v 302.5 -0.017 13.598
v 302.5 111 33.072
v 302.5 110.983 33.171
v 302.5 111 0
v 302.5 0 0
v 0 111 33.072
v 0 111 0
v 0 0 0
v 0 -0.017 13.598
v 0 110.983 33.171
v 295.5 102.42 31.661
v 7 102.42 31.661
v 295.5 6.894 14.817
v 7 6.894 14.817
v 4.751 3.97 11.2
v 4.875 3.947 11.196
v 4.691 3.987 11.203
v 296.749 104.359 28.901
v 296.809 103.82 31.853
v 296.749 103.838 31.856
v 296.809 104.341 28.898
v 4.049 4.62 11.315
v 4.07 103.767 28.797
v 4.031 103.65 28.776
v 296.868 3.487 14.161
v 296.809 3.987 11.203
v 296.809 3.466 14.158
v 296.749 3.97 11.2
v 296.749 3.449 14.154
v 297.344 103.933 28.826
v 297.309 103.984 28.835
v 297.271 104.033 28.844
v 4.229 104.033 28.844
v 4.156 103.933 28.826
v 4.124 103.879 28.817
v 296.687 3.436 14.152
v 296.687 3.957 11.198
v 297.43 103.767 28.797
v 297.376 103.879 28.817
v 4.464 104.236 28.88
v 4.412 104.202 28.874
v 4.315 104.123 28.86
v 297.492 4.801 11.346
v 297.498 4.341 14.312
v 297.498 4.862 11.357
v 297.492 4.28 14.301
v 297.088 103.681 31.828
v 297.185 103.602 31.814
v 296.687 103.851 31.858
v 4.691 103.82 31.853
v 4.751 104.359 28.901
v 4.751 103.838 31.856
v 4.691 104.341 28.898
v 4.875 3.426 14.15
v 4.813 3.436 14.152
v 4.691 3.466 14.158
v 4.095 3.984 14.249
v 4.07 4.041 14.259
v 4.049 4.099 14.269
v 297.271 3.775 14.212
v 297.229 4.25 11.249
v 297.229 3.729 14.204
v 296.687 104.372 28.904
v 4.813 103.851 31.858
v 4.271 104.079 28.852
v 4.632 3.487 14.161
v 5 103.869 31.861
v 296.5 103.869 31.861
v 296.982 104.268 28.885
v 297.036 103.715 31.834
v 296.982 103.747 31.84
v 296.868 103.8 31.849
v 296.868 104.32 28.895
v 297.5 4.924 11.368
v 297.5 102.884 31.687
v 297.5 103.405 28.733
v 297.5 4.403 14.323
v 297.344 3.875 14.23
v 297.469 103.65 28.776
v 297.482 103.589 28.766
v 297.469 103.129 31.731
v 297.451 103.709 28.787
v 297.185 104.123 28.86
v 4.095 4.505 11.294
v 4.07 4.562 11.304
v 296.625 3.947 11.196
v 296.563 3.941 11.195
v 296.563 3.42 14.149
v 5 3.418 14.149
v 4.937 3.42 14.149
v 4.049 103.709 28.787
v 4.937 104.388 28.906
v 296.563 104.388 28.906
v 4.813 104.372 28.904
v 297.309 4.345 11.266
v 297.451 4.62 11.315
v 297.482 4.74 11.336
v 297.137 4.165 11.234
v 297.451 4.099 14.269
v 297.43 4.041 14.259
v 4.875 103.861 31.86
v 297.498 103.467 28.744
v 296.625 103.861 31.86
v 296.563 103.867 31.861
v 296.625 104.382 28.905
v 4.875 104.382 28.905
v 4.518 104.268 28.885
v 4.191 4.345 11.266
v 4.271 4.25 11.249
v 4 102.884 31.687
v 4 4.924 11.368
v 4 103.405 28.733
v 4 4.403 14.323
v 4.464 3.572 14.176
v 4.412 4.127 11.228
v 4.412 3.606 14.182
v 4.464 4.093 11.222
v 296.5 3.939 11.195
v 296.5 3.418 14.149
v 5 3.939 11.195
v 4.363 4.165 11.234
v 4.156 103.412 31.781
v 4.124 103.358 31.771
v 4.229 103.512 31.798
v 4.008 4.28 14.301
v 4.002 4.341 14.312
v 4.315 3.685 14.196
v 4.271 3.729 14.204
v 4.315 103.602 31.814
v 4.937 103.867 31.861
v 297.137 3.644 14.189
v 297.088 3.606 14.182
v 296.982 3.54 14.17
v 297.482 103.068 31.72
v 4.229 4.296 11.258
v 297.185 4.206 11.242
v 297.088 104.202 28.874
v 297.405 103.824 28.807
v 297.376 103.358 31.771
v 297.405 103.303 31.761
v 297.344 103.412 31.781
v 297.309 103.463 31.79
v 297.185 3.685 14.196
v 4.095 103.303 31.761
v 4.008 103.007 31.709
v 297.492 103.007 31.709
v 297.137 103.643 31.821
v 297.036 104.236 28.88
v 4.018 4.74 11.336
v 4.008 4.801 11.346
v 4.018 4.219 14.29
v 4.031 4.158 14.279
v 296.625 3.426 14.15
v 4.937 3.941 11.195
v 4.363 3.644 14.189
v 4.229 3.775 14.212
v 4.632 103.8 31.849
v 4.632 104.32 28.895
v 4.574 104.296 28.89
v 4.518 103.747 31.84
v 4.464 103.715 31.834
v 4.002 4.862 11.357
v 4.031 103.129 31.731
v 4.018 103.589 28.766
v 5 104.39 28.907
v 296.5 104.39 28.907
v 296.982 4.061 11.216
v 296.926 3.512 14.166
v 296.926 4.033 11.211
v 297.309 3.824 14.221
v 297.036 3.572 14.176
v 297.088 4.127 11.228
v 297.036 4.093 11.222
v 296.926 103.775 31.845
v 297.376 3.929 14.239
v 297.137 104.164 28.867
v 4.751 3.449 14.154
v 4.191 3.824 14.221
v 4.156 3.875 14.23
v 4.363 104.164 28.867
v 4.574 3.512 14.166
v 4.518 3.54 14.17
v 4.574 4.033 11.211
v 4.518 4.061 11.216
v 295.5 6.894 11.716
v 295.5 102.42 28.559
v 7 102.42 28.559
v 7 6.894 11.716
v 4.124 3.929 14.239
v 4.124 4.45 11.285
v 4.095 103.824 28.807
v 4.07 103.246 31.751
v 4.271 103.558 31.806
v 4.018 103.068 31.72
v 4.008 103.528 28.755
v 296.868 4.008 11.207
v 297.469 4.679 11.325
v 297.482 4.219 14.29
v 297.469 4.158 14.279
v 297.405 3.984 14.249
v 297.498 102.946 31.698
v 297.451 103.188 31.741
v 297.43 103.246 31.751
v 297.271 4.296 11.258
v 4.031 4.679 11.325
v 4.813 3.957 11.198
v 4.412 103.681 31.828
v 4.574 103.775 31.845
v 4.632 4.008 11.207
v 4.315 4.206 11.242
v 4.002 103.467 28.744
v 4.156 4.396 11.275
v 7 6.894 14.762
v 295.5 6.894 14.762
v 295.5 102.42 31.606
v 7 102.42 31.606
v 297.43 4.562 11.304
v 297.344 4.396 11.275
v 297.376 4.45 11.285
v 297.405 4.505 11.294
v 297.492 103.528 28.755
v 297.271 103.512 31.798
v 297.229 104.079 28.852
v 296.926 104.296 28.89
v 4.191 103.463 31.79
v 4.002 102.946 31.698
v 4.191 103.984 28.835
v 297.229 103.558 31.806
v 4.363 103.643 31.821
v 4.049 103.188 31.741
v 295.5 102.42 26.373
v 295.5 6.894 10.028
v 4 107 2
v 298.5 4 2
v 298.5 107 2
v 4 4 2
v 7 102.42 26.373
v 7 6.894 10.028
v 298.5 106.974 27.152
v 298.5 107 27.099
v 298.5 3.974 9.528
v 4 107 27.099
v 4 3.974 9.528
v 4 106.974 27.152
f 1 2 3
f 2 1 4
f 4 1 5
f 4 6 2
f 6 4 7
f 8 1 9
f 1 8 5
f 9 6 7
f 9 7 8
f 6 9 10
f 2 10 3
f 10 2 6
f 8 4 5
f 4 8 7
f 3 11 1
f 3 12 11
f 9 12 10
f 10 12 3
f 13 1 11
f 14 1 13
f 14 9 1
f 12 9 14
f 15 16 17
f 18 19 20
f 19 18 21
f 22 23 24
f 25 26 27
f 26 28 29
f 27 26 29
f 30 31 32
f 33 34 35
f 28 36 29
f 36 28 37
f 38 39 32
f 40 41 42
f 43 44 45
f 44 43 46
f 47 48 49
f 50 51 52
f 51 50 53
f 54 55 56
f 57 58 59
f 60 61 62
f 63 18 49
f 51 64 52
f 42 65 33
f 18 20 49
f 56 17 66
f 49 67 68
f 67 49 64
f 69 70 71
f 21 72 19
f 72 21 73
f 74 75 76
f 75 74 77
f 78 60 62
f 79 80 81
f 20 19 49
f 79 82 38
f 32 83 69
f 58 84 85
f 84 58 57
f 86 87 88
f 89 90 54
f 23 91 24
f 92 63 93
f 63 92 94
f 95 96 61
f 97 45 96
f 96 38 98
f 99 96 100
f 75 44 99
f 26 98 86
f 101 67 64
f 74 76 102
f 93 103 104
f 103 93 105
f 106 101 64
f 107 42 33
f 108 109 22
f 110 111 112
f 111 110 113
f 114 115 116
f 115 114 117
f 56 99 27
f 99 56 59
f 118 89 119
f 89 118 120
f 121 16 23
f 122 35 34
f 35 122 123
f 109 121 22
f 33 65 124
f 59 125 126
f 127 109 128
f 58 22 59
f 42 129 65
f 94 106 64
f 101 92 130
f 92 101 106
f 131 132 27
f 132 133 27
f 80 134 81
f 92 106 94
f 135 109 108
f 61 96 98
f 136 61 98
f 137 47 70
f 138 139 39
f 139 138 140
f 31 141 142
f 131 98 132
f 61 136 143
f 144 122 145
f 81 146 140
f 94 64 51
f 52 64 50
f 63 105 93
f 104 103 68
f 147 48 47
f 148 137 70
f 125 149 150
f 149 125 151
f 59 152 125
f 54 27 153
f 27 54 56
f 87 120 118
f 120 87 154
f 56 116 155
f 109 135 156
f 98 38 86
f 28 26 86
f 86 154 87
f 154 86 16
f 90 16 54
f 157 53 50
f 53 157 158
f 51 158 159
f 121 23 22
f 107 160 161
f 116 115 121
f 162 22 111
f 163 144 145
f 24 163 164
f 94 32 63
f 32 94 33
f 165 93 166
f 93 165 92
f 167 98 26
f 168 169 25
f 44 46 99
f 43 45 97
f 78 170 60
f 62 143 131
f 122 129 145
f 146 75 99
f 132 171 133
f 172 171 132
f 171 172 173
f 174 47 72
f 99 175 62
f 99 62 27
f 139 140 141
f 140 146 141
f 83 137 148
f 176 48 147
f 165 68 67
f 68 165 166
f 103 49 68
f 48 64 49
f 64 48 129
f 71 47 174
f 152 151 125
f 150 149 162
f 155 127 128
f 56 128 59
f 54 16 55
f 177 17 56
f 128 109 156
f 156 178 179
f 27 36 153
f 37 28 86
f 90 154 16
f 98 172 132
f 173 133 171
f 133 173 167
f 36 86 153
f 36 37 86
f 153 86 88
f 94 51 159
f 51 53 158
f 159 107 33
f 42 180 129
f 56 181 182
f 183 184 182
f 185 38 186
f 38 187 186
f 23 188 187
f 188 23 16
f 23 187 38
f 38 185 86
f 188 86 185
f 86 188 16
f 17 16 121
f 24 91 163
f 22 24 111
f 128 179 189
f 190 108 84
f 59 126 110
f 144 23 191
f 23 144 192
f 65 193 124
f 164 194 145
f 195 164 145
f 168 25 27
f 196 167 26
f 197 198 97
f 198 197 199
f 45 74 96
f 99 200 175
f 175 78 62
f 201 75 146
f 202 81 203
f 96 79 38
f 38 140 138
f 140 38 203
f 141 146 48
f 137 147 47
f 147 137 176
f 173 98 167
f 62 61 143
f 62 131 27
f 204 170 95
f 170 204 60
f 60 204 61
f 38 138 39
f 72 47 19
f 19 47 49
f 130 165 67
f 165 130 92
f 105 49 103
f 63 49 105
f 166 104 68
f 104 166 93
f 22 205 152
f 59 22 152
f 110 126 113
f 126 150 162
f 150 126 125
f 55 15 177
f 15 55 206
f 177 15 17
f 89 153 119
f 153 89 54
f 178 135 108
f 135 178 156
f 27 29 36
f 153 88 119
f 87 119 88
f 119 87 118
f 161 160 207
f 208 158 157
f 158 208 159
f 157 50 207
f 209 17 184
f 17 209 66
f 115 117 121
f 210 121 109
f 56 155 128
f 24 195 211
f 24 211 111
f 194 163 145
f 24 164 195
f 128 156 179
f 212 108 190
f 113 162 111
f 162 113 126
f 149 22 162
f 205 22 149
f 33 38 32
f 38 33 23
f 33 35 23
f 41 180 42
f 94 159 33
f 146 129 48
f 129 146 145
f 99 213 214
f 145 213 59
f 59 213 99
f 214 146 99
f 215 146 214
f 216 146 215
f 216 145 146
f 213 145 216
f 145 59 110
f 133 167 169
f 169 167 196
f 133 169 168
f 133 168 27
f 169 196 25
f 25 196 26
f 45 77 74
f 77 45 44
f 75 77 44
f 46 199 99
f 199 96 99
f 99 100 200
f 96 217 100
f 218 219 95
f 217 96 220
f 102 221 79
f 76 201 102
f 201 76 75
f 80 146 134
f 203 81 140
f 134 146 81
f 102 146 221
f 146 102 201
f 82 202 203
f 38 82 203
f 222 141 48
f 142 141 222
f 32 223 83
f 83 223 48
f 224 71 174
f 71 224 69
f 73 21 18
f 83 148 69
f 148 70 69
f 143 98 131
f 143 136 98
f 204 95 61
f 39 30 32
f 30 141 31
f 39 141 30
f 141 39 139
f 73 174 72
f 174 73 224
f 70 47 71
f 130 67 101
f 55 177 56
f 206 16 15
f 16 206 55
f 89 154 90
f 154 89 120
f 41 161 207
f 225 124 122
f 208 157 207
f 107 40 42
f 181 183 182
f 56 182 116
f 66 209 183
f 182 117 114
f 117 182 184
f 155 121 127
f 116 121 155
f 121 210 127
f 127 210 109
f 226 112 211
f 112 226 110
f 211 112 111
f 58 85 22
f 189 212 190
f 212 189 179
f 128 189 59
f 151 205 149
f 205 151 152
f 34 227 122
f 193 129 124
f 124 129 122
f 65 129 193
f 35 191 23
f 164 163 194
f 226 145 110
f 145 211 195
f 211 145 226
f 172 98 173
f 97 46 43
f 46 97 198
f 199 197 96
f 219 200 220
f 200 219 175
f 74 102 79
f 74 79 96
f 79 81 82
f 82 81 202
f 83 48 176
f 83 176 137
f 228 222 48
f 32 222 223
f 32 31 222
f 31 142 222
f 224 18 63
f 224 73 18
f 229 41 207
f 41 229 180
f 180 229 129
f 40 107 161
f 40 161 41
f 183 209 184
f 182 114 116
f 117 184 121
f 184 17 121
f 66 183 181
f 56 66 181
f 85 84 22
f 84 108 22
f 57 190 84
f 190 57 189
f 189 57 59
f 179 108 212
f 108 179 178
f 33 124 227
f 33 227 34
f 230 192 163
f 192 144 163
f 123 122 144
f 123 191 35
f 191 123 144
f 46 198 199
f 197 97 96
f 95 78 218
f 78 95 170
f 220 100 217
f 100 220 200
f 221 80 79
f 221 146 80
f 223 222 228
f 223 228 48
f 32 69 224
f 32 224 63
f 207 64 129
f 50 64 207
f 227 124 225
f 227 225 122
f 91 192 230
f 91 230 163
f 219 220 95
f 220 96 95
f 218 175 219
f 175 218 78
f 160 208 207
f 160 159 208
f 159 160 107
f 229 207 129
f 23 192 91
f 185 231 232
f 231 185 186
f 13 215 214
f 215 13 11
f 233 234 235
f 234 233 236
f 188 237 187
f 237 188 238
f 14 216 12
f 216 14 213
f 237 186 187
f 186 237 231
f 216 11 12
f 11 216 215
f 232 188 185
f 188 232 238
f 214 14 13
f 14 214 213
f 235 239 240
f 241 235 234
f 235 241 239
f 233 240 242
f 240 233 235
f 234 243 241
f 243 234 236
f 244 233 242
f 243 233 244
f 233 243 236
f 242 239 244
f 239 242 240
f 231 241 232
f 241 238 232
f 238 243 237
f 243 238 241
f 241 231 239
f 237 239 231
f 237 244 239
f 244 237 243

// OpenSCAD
// file: keyboard_layout_maker.scad
// constants 
ROWS=5;
COLS=15;
PLATE_THICKNESS=3;
X_PADDING=5;
Y_PADDING=5;
STD_KEY_WIDTH=14.3;
STD_KEY_HEIGHT=14.6;
STD_CTC_DIFF_X= X_PADDING + STD_KEY_WIDTH;
STD_CTC_DIFF_Y= Y_PADDING + STD_KEY_HEIGHT;
MAX_X = X_PADDING + COLS*STD_CTC_DIFF_X;
MAX_Y = Y_PADDING + ROWS*STD_CTC_DIFF_Y;
$fn=100;

// zero indexed row offset for y
function y_row_offset(idx) = Y_PADDING + idx*(STD_CTC_DIFF_Y);

// getting x offset for given num_keys 
function x_key_offset(num_keys,size=1) = num_keys*(STD_CTC_DIFF_X*size);

function key_width(size) = ( 
  size 
    ? STD_KEY_WIDTH*size + floor((size-1)*X_PADDING) 
    : 0
);


// offset for single key larger than 1u 
function large_key_offset(size) = (
  2*X_PADDING 
  + STD_KEY_WIDTH*size 
  + floor((size-1)*X_PADDING)
); 

// standard switch mounting hole 
module sized_switch_mount(trans_vect,size=1) {
   translate(trans_vect)
     cube([
       key_width(size),
       STD_KEY_HEIGHT,
       PLATE_THICKNESS + 0.2
      ]);   
};

// large key right adjusted 
module large_key_right (key_size, row, hole_size, offset=0) {
  sized_switch_mount(
    [
      ( X_PADDING 
        + ((key_size-hole_size)*STD_KEY_WIDTH) / 2
        + ( offset ? key_width(offset) + 5 : 0 )
      ), 
      y_row_offset(row),
     -0.1
    ],
    hole_size
  );
}

// large key left adjusted
module large_key_left (key_size, row, hole_size, offset=0) {
  sized_switch_mount(
    [ 
      MAX_X - (
        X_PADDING 
        + ((key_size-hole_size)*STD_KEY_WIDTH) / 2
        + key_width(hole_size)
        + ( offset ? key_width(offset) + 5 : 0 ) 
      ),
      y_row_offset(row),
      -0.1
    ],
    hole_size
  );
}


// row of consecutive 1u keys 
module one_u_row(x_edge_offset, y_edge_offset, num_keys) {
  end_range = -1 + x_edge_offset + (STD_CTC_DIFF_X*num_keys);
  for (i=[x_edge_offset:STD_CTC_DIFF_X:end_range]) {
    sized_switch_mount([i,y_edge_offset, -0.1]);
  }
};

module cons_xu_row( x_edge_offset, y_edge_offset, size, numkeys) {
  end_range = -1 + x_edge_offset + (STD_CTC_DIFF_X*num_keys*size);
  for (i=[x_edge_offset:STD_CTC_DIFF_X*size:end_range]) {
    sized_switch_mount([i,y_edge_offset,-0.1], size); 
  }  
};

// bare plate with no holes 
module plate( rows , cols , height=PLATE_THICKNESS) {
  cube([
    MAX_X,
    MAX_Y,
    height
  ]);
};

module rounded_plate ( rows, cols, radius, height=PLATE_THICKNESS) {
  hull () {
    
    // end points for the plate 
    points = [ 
      [ radius , MAX_X-(radius*2)] , 
      [ radius , MAX_Y-(radius*2)]
    ];
  
    // placing cylinders 
    for( i=[0:1:1] ) {
     for ( j=[0:1:1]) {
      translate([points[0][i],points[1][j],0])
        cylinder(r=radius, h=height); 
    }};
    
  }
};

module sixty_ansi_layout () {
    // row 0 
    large_key_right(key_size=2,row=0,hole_size=2);
    one_u_row(
      x_edge_offset=large_key_offset(2),
      y_edge_offset=y_row_offset(0),
      num_keys=13
    );
  
    // row 1 
    large_key_right(key_size=1.5,row=1,hole_size=1);
    one_u_row(
      x_edge_offset=large_key_offset(1.5),
      y_edge_offset=y_row_offset(1),
      num_keys=12
    );
    large_key_left(key_size=1.5,row=1,hole_size=1);
    
    // row 2
    large_key_right(key_size=2.25,row=2,hole_size=2.25);
    one_u_row(
      x_edge_offset=large_key_offset(2.25),
      y_edge_offset=y_row_offset(2),
      num_keys=11
    );
    large_key_left(key_size=1.75,row=2,hole_size=1);
  
    // row 3 
    large_key_right(key_size=2.75,row=3,hole_size=2.75);
    one_u_row(
      x_edge_offset=large_key_offset(2.75),
      y_edge_offset=y_row_offset(3),
      num_keys=10
    );
    large_key_left(key_size=2.25, row=3, hole_size=2.25);
  
    // row 4
    large_key_right(key_size=6.25, row=4, hole_size=6.25, offset=4*1.25);
    large_key_right(key_size=1.25, row=4, hole_size=1);
    large_key_right(key_size=1.25, row=4, hole_size=1, offset=1.25);
    large_key_right(key_size=1.25, row=4, hole_size=1, offset=2.5);
    large_key_right(key_size=1.25, row=4, hole_size=1, offset=3.75);
    large_key_left (key_size=1.25, row=4, hole_size=1);
    large_key_left (key_size=1.25, row=4, hole_size=1, offset=1.25);
    large_key_left (key_size=1.25, row=4, hole_size=1, offset=2.5);
}; 

// 60% keyboard plate 
module sixty_ansi_plate () {
  difference (){
    rounded_plate(ROWS,COLS, 0.5);
    sixty_ansi_layout(); 
  };
};

module sixty_case() {
  difference () {
    cube([
      MAX_X + 4,
      MAX_Y + 4,
      12
    ]);
    rotate(0, [1,0,0]) {
    translate([2,2,10.5])
    rounded_plate(ROWS,COLS,0.6,20);
     
    translate([3.5,3.5,2])
    cube([
      MAX_X - 3,
      MAX_Y - 3,
      20
    ]);
    }
  }
};

//sixty_case();
//sixty_ansi_plate(ROWS,COLS, 0.5);

//translate([0,105,0])
//  sixty_case();

/* this is like a stand to incline the keyboard
translate([305,0,0])
difference () { 
#cube([MAX_X + 6, MAX_Y + 4, 20]);
translate([1,2,0])
rotate(10,[1,0,0])
  cube([
    MAX_X + 4,
    MAX_Y + 4,
    200
  ]);
};
*/
// main file
include <keyboard_layout_maker.scad>

$fn=100;

CASE_PADDING_X = 4; 
CASE_PADDING_Y = 4; 
CASE_PADDING_Z = 2; 
INCLINE_ANGLE = 10; 
SWITCH_BOTTOM_HEIGHT = 8.5; 
PLATE_LIP_SIZE = 3; 

function sq(x) = x*x; 

module rounded_ansi_plate() { 
  difference () { 
    rounded_plate(ROWS,COLS,0.5);
    sixty_ansi_layout () ; 
  };
};  

module rounded_case_block (ang=INCLINE_ANGLE) { 
  LENGTH = MAX_X + CASE_PADDING_X*2;
  WIDTH  = MAX_Y + CASE_PADDING_Y*2; 
  HEIGHT = 
    PLATE_THICKNESS
    + SWITCH_BOTTOM_HEIGHT
    + CASE_PADDING_Z ;
      
  hull () {
    // base shape  
    cube([
      LENGTH,
      WIDTH,
      HEIGHT
    ]);
    
    // finding the length of the top side with the incline   
    opp = (WIDTH * tan(ang));
    hyp = sqrt(sq(opp) + sq(WIDTH)); 
      
      
    translate([0,0,HEIGHT ])   
    rotate([ang,0,0]) 
    cube([
      LENGTH, 
      hyp,
      0.1
    ]);
  } 
} ;

module rounded_case ( ang=INCLINE_ANGLE ) { 
  HEIGHT = 
    PLATE_THICKNESS
    + SWITCH_BOTTOM_HEIGHT
    + CASE_PADDING_Z ;
    
  difference () { 
    // base block 
    rounded_case_block(ang) ;
      
    // plate cutout 
    translate([
      0,
      CASE_PADDING_Y*cos(ang),
      CASE_PADDING_Y*sin(ang)  
    ])
    translate([CASE_PADDING_X,0,HEIGHT-PLATE_THICKNESS]) 
    rotate([ang, 0,0])
    rounded_plate(ROWS, COLS, 1) ;
    
    // negative space for internals
    // just realized its gonna take some trig ....  
    translate([
      (CASE_PADDING_X + PLATE_LIP_SIZE), 
      (CASE_PADDING_Y + PLATE_LIP_SIZE)*cos(ang), 
      CASE_PADDING_Z])
    cube([
      MAX_X-PLATE_LIP_SIZE*2,
      (MAX_Y-PLATE_LIP_SIZE*2)*cos(ang),
      30
    ]);
    
    
    // this is bad but bear with me 
    LENGTH = MAX_X + CASE_PADDING_X*2;
    WIDTH  = MAX_Y + CASE_PADDING_Y*2; 
    HEIGHT = 
      PLATE_THICKNESS
      + SWITCH_BOTTOM_HEIGHT
      + CASE_PADDING_Z ;
      
    #translate([CASE_PADDING_X,CASE_PADDING_Y,CASE_PADDING_Z ])
    scale([
      // x -> should be == length - 2*case_padding_x
      MAX_X/LENGTH,  
      // y -> should be == width  - 2*case_padding_y
      MAX_Y/WIDTH, 
      // z -> should be == height - 2*case_padding_z 
      ((HEIGHT-2*CASE_PADDING_Z)/HEIGHT) - 0.15   
    ]) { rounded_case_block(ang+6); };
  }
}; 

rounded_case (10) ; 
